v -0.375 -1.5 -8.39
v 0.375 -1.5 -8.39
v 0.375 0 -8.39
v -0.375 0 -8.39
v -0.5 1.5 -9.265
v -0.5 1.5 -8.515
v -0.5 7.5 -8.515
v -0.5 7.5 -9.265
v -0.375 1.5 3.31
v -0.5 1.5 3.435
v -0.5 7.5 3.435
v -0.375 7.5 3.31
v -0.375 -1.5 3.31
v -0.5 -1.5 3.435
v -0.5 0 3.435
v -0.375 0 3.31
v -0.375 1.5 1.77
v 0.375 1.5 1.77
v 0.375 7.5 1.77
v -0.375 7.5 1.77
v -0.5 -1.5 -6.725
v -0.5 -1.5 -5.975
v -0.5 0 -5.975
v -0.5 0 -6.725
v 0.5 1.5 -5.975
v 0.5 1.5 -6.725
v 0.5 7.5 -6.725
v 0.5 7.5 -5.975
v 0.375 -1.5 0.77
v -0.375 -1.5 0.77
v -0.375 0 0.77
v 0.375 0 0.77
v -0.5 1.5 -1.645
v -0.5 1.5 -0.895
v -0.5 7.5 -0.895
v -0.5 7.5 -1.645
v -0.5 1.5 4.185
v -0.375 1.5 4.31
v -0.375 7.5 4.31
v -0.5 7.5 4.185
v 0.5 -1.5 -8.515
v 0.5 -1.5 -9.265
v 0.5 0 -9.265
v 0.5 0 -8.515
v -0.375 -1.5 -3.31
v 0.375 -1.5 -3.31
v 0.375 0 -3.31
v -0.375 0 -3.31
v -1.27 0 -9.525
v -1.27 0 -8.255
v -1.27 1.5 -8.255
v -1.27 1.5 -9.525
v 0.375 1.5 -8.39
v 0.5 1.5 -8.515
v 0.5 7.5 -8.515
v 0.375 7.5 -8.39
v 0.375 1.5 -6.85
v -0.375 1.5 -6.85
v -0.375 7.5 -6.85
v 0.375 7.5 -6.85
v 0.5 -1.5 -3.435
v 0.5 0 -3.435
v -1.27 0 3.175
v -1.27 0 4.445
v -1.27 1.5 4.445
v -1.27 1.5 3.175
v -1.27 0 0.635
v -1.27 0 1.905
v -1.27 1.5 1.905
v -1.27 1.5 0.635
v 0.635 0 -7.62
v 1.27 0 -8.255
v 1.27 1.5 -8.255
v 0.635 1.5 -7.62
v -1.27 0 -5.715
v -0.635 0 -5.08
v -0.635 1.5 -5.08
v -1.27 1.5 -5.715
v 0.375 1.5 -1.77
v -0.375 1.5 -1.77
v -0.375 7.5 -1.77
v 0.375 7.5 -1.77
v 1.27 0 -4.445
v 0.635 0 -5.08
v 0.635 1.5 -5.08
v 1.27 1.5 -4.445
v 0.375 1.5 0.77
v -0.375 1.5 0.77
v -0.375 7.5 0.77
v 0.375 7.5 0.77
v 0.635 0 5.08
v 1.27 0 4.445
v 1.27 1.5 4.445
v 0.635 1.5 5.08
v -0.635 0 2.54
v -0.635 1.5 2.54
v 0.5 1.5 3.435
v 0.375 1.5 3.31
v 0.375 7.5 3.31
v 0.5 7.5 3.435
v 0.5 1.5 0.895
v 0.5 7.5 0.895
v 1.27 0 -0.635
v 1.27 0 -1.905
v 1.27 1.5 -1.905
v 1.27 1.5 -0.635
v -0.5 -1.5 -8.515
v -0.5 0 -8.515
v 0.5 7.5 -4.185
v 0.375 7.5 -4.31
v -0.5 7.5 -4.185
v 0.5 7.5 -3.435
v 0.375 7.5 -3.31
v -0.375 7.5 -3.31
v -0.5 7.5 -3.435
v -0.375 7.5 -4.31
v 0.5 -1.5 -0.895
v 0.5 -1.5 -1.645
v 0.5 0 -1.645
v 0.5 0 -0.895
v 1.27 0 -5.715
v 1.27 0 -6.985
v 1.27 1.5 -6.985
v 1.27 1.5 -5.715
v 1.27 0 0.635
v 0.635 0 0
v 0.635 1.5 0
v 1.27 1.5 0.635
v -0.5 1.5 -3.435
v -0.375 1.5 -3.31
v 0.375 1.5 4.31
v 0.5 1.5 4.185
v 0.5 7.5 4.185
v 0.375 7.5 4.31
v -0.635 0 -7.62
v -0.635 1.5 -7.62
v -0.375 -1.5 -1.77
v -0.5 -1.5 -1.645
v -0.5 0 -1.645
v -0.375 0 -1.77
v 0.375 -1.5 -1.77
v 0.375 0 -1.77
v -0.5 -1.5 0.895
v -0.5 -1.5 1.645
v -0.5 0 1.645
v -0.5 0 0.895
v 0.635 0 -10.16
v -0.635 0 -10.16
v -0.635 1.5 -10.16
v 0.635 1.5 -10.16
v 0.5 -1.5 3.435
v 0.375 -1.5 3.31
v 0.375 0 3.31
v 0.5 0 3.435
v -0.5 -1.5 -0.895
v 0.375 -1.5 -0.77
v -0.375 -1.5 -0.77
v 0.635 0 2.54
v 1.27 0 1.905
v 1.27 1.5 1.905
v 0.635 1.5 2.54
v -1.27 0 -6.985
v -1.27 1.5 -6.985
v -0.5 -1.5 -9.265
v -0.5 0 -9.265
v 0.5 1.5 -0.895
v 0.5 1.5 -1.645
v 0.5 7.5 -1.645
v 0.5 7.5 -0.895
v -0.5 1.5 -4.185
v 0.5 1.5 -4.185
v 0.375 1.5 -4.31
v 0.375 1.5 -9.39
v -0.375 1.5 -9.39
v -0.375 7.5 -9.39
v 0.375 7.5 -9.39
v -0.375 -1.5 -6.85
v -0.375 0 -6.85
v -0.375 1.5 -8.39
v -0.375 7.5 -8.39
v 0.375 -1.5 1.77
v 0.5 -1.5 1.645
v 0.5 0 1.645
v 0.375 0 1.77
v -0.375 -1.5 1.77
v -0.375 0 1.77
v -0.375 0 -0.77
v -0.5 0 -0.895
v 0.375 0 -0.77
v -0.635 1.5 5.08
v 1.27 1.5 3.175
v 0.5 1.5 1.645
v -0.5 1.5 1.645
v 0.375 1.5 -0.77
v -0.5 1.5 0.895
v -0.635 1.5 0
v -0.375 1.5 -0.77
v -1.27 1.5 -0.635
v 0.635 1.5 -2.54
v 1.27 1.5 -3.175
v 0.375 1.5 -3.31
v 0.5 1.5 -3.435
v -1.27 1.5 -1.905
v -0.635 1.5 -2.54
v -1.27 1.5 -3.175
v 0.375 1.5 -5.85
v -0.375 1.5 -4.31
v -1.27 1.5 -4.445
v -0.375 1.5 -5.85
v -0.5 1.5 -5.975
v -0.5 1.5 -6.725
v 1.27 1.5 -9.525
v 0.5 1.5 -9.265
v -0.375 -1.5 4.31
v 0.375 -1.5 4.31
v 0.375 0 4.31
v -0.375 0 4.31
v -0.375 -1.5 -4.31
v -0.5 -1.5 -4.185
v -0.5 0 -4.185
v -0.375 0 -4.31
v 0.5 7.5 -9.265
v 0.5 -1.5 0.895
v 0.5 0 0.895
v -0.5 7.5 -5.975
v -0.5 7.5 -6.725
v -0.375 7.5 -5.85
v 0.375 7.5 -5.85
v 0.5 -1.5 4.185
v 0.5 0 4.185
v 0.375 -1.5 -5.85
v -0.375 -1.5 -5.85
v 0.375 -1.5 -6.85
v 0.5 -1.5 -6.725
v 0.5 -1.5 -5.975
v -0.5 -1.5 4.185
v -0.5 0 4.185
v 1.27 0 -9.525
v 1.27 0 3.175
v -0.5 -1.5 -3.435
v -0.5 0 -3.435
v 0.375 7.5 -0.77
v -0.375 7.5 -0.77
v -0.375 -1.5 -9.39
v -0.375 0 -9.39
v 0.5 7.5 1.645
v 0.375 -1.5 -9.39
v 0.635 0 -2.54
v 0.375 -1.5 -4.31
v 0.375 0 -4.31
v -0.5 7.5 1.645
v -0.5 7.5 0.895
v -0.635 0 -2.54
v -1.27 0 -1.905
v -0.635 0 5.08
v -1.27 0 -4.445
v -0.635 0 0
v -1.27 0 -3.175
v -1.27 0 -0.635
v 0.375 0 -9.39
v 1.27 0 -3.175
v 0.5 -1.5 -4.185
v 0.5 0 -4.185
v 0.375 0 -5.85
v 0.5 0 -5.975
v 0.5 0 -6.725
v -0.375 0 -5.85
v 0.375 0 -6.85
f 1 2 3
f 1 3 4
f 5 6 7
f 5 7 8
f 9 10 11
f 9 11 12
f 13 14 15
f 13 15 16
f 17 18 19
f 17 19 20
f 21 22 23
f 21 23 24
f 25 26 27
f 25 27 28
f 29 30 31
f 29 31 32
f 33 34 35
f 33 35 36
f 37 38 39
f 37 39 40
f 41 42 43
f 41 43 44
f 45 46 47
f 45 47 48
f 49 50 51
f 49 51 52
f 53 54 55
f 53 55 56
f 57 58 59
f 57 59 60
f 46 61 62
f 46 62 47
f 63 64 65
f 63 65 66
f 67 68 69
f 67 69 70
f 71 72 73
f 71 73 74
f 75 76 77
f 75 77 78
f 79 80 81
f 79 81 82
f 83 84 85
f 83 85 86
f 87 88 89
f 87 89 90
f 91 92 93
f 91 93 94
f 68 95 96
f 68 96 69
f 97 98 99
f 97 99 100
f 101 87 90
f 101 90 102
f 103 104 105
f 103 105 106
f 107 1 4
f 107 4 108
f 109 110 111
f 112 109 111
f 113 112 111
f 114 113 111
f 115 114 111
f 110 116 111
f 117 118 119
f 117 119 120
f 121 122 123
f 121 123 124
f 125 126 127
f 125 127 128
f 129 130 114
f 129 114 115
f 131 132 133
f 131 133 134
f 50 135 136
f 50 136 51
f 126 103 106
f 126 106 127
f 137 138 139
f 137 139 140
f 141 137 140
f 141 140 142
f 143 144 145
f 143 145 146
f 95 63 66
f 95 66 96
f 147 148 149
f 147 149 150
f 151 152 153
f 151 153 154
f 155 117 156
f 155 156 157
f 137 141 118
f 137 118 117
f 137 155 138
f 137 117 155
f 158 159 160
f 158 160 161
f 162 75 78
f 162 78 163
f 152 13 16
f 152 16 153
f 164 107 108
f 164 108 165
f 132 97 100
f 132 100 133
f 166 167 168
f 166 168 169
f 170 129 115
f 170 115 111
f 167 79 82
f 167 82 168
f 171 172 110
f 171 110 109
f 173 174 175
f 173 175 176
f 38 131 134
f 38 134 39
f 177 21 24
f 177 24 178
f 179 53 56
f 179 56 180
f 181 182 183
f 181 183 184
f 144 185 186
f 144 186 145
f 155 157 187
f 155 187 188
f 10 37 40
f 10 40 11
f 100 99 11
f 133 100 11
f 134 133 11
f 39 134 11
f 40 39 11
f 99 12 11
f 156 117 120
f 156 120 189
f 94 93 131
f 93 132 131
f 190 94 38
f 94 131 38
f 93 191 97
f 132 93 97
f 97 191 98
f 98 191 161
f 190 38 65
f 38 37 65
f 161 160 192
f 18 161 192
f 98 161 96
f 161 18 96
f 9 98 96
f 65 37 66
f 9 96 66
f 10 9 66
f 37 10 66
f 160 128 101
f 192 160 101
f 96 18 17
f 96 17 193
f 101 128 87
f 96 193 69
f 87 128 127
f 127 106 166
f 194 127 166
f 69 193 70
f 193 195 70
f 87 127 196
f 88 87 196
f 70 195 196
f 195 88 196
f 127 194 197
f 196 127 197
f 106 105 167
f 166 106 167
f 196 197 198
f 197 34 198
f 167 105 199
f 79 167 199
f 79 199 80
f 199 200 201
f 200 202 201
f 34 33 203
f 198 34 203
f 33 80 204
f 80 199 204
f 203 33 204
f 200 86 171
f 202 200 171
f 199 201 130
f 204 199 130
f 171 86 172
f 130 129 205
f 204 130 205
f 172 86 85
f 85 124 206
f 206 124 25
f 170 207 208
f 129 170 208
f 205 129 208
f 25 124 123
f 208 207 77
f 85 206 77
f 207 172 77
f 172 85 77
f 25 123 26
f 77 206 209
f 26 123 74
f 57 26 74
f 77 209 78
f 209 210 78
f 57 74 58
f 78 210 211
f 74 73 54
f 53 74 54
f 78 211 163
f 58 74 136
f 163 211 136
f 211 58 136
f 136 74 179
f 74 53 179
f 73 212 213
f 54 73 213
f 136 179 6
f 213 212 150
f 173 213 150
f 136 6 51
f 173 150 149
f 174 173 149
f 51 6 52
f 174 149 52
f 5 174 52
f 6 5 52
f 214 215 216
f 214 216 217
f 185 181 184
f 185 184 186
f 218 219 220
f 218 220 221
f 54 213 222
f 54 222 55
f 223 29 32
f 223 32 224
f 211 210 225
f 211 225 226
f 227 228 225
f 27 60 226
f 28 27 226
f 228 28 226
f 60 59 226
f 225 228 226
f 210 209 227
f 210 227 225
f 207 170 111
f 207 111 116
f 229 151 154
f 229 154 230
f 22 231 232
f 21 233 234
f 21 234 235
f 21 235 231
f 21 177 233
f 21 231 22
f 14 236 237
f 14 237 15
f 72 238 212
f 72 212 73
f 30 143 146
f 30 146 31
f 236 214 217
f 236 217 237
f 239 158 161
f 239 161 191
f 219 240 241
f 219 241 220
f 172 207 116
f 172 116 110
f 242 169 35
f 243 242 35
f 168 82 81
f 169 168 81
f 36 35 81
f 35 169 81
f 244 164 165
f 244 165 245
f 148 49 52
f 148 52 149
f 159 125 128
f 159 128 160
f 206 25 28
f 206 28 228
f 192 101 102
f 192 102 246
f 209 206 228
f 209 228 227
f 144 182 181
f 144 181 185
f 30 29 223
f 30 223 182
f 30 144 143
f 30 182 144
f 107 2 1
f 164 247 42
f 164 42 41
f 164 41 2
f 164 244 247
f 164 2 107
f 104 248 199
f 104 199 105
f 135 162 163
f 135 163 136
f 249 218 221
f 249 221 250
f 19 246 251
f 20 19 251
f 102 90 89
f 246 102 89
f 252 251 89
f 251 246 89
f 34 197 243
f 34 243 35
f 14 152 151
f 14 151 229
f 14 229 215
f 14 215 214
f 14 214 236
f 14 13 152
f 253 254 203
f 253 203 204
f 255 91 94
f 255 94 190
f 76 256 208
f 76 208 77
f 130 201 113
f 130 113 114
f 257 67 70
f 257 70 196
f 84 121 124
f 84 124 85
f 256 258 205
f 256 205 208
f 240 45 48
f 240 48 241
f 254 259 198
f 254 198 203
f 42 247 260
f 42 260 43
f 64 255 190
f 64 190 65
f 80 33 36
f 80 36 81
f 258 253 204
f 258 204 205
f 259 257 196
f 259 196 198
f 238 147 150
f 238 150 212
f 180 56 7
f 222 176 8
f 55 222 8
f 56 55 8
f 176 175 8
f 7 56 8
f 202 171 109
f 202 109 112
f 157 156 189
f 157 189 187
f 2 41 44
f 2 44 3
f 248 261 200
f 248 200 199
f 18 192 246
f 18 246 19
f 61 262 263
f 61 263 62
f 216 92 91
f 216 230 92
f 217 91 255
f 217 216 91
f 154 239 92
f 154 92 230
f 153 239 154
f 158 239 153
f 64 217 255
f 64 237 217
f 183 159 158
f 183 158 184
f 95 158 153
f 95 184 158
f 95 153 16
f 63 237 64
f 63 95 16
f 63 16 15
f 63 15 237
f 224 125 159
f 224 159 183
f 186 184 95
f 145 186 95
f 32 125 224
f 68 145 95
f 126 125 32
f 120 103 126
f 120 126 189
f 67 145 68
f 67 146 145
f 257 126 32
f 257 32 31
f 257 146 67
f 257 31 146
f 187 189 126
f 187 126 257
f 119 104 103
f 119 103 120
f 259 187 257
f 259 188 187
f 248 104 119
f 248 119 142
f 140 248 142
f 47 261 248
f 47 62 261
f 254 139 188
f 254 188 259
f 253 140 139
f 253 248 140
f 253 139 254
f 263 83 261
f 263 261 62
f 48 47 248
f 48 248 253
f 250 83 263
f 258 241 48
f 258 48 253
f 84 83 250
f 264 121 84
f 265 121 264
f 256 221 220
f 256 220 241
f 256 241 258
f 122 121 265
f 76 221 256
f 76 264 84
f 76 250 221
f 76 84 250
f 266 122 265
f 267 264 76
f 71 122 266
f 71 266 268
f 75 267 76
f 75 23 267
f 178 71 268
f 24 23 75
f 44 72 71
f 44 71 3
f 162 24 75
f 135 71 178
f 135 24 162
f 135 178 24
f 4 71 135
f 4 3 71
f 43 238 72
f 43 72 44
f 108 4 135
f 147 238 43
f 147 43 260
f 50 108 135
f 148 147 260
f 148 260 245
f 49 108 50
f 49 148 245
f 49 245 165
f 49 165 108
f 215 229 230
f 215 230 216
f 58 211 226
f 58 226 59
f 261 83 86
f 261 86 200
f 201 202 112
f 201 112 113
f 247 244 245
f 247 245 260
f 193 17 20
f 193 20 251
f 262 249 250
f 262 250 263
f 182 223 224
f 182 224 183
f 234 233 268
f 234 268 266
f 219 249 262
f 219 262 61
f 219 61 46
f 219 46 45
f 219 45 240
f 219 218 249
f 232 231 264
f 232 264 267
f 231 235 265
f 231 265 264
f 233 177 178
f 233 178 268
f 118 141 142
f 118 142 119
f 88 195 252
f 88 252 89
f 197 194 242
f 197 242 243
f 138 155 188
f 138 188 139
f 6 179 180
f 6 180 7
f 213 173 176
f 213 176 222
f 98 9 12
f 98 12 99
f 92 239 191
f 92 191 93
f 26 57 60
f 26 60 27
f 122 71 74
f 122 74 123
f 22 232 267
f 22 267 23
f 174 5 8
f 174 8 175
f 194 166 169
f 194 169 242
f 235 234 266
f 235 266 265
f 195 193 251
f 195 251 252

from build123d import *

# Parameters (mm, degrees)
BOSS_EXTRUDE1_DEPTH      = 1.5
BOSS_EXTRUDE2_DEPTH      = 6
BOSS_EXTRUDE2_DEPTH_BACK = 3


with BuildPart() as part:
    # Sketch1 → Boss-Extrude1 (new body)
    with BuildSketch(Plane(origin=(0, 0, 0), x_dir=(1, 0, 0), z_dir=(0, 1, 0))):
        Polygon((-0.635, 10.16), (0.635, 10.16), (1.27, 9.525), (1.27, 8.255), (0.635, 7.62), (1.27, 6.985), (1.27, 5.715), (0.635, 5.08), (1.27, 4.445), (1.27, 3.175), (0.635, 2.54), (1.27, 1.905), (1.27, 0.635), (0.635, 0), (1.27, -0.635), (1.27, -1.905), (0.635, -2.54), (1.27, -3.175), (1.27, -4.445), (0.635, -5.08), (-0.635, -5.08), (-1.27, -4.445), (-1.27, -3.175), (-0.635, -2.54), (-1.27, -1.905), (-1.27, -0.635), (-0.635, 0), (-1.27, 0.635), (-1.27, 1.905), (-0.635, 2.54), (-1.27, 3.175), (-1.27, 4.445), (-0.635, 5.08), (-1.27, 5.715), (-1.27, 6.985), (-0.635, 7.62), (-1.27, 8.255), (-1.27, 9.525), align=None)
    extrude(amount=BOSS_EXTRUDE1_DEPTH)

    # Sketch3 → Boss-Extrude2 (add, two sides: drawn at the far end of the back side and taken through both)
    with BuildSketch(Plane(origin=(0, 1.5, 0), x_dir=(1, 0, 0), z_dir=(0, 1, 0)).offset(-BOSS_EXTRUDE2_DEPTH_BACK)):
        Polygon((0.375, 9.39), (0.5, 9.265), (0.5, 8.515), (0.375, 8.39), (-0.375, 8.39), (-0.5, 8.515), (-0.5, 9.265), (-0.375, 9.39), align=None)
        Polygon((0.375, 6.85), (0.5, 6.725), (0.5, 5.975), (0.375, 5.85), (-0.375, 5.85), (-0.5, 5.975), (-0.5, 6.725), (-0.375, 6.85), align=None)
        Polygon((0.375, 4.31), (0.5, 4.185), (0.5, 3.435), (0.375, 3.31), (-0.375, 3.31), (-0.5, 3.435), (-0.5, 4.185), (-0.375, 4.31), align=None)
        Polygon((0.375, 1.77), (0.5, 1.645), (0.5, 0.895), (0.375, 0.77), (-0.375, 0.77), (-0.5, 0.895), (-0.5, 1.645), (-0.375, 1.77), align=None)
        Polygon((0.375, -0.77), (0.5, -0.895), (0.5, -1.645), (0.375, -1.77), (-0.375, -1.77), (-0.5, -1.645), (-0.5, -0.895), (-0.375, -0.77), align=None)
        Polygon((0.375, -3.31), (0.5, -3.435), (0.5, -4.185), (0.375, -4.31), (-0.375, -4.31), (-0.5, -4.185), (-0.5, -3.435), (-0.375, -3.31), align=None)
    extrude(amount=BOSS_EXTRUDE2_DEPTH + BOSS_EXTRUDE2_DEPTH_BACK)


solid = part.part
